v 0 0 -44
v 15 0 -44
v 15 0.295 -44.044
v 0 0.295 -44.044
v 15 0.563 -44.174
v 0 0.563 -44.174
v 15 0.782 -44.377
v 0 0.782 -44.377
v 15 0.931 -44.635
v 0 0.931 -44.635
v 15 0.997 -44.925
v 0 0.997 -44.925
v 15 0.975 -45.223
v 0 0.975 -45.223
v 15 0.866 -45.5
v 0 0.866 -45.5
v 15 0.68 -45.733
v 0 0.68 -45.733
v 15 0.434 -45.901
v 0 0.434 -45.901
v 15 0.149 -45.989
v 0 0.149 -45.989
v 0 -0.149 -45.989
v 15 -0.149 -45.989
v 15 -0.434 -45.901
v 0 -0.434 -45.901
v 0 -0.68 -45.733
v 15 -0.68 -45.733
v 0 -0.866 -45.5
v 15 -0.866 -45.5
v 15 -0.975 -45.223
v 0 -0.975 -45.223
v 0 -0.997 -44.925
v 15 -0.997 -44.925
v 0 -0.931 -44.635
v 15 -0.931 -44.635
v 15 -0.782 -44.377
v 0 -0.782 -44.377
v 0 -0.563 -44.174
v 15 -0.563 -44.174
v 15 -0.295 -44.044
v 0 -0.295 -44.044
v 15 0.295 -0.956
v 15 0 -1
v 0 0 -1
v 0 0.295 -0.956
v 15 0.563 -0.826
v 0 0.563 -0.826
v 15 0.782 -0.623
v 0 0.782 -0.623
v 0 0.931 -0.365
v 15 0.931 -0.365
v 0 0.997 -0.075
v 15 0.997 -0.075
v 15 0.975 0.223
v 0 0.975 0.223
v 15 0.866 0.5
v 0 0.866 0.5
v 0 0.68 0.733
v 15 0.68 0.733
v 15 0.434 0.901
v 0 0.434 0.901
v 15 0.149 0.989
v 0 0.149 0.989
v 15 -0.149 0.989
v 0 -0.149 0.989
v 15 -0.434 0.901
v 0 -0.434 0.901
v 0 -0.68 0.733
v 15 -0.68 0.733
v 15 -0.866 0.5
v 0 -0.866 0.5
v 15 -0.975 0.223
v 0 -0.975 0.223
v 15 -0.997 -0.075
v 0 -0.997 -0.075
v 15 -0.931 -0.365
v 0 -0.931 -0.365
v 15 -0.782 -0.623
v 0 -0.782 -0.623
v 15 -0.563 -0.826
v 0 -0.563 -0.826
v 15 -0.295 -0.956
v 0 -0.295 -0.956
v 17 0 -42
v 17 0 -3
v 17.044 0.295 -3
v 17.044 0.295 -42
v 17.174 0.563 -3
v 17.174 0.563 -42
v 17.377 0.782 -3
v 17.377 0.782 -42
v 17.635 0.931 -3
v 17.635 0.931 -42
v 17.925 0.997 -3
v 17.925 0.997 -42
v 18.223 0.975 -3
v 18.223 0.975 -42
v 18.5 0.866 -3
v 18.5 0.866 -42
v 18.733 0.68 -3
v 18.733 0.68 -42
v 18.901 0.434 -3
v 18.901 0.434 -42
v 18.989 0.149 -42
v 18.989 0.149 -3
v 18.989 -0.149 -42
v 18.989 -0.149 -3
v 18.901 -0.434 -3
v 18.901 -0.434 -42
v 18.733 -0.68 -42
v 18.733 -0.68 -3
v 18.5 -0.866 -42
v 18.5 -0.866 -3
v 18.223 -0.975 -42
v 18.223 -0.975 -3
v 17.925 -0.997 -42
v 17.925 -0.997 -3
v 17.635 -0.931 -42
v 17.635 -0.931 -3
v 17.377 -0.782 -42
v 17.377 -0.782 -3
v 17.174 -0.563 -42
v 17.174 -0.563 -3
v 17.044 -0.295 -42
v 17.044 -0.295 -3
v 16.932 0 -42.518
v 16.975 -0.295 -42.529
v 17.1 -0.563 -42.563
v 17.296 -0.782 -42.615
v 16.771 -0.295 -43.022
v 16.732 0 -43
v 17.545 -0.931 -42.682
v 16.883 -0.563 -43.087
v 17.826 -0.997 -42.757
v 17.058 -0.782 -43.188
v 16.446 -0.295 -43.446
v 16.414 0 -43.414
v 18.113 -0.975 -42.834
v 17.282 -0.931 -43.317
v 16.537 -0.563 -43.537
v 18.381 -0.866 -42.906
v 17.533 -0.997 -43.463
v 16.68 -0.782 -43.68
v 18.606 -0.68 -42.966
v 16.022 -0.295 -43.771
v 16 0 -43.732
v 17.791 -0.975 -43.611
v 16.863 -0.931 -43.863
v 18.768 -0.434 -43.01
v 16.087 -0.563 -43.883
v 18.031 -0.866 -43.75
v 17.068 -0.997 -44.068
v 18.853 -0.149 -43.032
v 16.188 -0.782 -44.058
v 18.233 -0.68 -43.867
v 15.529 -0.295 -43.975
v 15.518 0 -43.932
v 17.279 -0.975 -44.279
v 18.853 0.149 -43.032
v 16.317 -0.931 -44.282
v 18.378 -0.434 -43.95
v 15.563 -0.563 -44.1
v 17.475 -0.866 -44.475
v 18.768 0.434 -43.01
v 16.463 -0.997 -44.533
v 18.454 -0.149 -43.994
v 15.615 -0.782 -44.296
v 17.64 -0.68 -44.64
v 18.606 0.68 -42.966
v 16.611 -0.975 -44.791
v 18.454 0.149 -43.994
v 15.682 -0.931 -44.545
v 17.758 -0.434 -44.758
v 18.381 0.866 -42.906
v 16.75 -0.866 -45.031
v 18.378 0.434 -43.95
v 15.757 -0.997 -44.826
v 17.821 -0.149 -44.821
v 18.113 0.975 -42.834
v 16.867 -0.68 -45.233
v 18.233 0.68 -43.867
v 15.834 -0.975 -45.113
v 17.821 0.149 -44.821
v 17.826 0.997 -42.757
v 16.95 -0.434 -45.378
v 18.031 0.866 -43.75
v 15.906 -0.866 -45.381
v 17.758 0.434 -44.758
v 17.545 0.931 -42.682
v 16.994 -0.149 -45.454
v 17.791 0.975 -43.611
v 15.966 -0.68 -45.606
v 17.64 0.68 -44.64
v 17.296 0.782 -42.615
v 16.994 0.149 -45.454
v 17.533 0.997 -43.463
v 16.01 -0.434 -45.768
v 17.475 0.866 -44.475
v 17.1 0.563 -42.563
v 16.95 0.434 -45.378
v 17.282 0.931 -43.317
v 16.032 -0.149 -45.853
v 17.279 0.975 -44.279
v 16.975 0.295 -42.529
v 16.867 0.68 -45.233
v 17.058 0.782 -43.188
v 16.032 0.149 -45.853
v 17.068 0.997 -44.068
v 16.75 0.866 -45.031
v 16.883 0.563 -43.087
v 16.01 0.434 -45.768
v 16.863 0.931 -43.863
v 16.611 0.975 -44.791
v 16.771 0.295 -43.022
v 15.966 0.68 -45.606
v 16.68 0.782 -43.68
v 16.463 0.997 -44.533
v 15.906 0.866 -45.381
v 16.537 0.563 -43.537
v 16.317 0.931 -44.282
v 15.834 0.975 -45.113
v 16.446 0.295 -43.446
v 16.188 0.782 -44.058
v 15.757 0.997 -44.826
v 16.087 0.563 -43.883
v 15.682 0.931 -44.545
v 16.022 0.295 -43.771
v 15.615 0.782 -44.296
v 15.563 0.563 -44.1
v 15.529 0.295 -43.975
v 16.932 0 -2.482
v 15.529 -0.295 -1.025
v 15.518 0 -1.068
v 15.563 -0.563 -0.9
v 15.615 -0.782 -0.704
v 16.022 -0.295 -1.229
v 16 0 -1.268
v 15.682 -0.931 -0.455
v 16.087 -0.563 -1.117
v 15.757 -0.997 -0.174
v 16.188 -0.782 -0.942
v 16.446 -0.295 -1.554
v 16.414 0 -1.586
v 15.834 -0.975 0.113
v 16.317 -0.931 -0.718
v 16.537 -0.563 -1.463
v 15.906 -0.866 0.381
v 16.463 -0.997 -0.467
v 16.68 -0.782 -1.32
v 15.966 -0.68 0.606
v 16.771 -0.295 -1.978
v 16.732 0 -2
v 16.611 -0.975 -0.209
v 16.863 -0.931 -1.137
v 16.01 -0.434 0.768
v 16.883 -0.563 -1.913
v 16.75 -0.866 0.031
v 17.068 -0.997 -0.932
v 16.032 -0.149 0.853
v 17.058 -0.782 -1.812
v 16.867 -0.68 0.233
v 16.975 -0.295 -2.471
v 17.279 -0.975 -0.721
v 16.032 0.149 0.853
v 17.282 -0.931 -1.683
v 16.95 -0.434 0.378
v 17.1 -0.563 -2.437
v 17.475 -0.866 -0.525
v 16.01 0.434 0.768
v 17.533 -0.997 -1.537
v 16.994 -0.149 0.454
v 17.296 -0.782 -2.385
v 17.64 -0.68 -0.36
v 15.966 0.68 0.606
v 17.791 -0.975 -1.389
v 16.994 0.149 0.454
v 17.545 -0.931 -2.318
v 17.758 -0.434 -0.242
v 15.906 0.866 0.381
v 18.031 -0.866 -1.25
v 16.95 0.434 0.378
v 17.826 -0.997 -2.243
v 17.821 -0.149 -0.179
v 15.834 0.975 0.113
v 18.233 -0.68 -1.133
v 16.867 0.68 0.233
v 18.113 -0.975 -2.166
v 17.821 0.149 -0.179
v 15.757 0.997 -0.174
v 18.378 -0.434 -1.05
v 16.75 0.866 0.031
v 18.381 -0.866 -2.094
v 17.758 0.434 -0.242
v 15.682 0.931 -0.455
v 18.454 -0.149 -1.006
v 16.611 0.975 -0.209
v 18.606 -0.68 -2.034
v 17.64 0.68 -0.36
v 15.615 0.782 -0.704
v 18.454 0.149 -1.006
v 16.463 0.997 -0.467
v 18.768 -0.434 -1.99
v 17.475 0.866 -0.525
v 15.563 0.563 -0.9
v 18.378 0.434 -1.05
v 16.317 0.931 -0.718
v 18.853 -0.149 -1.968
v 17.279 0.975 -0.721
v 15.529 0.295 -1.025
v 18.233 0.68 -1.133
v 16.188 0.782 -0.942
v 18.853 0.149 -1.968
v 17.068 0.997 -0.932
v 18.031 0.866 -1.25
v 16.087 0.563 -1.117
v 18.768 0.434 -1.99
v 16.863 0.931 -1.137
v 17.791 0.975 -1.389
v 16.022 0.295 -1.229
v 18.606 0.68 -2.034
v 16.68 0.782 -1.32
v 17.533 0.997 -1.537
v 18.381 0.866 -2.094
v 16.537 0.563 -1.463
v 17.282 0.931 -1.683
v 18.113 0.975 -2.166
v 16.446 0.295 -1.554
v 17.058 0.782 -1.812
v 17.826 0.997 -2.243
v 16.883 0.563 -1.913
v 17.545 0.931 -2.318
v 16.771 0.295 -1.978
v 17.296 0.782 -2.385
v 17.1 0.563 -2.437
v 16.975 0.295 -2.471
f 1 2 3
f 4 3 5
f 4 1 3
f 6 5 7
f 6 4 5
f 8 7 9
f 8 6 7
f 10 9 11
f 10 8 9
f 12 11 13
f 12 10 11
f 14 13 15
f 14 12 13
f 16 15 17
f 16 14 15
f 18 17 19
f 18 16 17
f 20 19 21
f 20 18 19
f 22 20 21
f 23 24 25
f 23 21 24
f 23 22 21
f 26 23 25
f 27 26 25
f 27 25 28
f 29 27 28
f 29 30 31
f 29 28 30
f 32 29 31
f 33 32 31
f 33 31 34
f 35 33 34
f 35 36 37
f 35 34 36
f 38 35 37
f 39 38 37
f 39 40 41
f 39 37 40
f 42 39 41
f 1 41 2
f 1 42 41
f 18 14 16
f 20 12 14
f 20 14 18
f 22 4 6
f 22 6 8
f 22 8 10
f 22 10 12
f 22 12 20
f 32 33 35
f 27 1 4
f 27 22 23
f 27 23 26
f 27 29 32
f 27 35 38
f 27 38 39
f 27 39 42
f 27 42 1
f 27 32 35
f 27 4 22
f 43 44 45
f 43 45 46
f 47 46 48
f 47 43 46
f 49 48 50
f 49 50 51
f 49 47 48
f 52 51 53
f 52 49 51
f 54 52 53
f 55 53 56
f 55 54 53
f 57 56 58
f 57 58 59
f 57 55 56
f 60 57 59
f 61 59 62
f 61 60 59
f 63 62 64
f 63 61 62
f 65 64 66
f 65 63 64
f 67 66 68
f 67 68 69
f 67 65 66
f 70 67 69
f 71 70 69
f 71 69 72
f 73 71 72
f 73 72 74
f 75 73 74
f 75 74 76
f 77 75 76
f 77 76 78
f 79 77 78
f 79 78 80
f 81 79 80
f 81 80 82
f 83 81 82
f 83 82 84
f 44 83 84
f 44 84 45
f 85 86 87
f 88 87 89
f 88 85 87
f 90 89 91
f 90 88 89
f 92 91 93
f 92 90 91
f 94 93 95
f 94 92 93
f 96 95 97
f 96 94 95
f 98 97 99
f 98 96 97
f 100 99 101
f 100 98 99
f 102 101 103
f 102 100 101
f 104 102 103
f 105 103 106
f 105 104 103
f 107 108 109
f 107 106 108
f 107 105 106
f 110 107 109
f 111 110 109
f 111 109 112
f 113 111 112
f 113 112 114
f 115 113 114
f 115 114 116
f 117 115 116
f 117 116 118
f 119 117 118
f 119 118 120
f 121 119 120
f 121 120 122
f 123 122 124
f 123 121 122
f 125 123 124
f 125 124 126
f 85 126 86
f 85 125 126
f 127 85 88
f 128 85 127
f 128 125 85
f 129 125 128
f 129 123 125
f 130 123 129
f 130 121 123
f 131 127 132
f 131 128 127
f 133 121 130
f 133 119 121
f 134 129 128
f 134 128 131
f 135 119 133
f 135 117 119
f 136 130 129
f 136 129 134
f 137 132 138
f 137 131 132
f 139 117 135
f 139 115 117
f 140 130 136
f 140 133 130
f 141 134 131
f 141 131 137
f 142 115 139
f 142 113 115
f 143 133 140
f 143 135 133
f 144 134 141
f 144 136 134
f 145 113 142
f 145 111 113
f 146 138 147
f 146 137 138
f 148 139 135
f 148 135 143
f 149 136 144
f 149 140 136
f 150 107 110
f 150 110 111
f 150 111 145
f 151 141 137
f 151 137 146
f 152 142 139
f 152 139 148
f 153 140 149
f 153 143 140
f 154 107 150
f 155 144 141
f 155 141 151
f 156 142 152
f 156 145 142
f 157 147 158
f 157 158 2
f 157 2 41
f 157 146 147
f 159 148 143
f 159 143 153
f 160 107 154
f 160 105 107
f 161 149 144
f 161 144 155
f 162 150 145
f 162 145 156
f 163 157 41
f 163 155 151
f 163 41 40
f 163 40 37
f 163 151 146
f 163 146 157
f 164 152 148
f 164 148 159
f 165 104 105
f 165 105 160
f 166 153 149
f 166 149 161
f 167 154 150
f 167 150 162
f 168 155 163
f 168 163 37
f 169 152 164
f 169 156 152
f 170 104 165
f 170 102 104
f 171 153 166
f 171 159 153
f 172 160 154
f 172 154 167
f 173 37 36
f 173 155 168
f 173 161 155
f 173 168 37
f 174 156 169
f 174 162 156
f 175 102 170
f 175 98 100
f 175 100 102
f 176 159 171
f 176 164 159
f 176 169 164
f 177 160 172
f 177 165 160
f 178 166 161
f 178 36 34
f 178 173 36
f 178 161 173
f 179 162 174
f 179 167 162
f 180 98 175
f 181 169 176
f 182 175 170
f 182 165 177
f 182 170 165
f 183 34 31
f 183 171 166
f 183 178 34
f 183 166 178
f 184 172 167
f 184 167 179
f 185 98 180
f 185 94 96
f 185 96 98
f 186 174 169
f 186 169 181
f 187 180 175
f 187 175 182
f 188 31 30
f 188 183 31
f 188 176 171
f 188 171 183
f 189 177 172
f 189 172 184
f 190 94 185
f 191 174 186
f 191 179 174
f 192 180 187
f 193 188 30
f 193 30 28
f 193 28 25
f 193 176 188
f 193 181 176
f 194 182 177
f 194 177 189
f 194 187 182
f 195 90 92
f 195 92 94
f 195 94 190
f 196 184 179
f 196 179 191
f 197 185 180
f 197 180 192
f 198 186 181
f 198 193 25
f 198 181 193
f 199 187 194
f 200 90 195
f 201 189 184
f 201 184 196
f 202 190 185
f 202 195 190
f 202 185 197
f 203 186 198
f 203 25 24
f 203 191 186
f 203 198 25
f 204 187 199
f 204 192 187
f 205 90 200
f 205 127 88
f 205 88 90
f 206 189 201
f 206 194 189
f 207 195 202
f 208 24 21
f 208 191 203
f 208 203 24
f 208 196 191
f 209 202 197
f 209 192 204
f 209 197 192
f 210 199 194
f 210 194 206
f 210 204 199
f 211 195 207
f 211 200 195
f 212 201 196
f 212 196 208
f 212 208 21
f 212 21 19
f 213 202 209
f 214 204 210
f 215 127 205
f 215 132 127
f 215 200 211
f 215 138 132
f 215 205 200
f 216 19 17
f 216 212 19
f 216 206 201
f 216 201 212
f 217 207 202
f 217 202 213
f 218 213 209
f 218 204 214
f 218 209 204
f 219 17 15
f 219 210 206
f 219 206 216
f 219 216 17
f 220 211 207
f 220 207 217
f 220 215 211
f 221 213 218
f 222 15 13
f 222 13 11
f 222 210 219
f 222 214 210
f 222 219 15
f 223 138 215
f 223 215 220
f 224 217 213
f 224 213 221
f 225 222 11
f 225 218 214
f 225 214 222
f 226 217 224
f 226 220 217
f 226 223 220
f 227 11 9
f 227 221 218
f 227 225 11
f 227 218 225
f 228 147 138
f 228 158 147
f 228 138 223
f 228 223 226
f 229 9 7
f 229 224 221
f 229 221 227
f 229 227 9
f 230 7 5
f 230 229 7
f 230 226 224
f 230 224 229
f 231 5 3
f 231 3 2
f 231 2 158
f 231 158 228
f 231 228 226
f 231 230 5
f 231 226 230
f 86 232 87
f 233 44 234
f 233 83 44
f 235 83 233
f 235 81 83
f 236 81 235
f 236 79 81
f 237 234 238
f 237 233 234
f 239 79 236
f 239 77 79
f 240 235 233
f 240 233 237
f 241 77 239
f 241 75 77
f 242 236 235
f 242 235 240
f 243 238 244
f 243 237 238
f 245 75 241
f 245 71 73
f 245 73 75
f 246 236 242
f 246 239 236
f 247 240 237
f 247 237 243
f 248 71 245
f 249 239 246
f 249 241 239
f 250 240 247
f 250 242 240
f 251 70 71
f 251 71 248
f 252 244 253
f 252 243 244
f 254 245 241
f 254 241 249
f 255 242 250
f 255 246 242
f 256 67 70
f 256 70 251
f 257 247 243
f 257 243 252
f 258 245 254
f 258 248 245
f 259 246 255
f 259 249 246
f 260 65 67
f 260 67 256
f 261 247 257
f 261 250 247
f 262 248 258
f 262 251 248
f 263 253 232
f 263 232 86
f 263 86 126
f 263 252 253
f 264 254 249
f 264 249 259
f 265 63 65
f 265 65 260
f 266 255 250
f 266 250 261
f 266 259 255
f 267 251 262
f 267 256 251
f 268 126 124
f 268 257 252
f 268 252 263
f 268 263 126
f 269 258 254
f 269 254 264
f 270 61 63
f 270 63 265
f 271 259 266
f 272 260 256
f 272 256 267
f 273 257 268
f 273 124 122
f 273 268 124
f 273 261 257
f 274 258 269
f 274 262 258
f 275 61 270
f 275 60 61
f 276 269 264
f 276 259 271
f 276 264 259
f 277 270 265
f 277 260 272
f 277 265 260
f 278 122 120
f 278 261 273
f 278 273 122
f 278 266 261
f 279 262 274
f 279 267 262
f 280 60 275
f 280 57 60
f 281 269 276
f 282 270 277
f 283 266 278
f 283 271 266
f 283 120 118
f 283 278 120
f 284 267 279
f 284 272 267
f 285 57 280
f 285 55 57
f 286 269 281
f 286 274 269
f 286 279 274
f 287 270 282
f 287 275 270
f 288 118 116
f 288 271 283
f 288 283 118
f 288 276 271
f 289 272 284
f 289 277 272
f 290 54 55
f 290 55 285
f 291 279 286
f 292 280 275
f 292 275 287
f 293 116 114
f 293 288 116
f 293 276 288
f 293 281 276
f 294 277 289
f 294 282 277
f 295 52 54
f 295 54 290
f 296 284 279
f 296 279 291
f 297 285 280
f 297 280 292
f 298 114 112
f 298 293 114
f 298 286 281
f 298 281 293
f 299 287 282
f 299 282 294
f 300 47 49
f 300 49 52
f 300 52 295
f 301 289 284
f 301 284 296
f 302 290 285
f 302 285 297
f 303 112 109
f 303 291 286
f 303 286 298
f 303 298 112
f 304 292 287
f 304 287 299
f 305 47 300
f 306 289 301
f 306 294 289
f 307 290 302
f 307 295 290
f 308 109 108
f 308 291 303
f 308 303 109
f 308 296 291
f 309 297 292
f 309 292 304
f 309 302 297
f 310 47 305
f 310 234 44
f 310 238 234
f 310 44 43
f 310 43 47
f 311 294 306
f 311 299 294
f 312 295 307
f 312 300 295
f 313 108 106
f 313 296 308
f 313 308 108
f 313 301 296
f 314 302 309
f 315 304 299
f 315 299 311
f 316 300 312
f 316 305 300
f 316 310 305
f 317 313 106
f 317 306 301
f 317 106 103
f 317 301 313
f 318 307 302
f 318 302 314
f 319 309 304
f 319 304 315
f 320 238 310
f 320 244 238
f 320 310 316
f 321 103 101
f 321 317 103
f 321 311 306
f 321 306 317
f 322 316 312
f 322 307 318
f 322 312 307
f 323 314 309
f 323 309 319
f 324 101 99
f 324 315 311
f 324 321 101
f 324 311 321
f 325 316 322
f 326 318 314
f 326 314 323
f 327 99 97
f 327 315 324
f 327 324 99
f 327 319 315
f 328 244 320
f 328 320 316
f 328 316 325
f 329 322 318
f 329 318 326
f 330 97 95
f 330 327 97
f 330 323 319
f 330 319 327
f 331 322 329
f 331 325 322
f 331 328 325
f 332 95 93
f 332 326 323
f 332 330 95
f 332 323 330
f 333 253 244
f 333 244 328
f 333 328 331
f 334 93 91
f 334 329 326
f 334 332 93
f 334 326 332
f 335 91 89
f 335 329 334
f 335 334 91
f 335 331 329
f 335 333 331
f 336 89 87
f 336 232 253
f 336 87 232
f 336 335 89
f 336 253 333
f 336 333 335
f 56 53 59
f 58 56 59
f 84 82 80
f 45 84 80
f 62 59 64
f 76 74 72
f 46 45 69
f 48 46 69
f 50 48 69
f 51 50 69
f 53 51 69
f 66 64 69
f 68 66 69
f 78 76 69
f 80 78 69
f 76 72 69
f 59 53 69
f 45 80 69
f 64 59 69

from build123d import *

# Parameters (mm, degrees)
SKETCH_1_R = 1


with BuildPart() as part:
    # По траектории1: sweep along a curve in space
    with BuildLine() as sweep_1_path:
        Line((0, 0, 0), (15, 0, 0))
        ThreePointArc((15, 0, 0), (17.121320344, 0, -0.878679656), (18, 0, -3))
        Line((18, 0, -3), (18, 0, -42))
        ThreePointArc((18, 0, -42), (17.121320344, 0, -44.121320344), (15, 0, -45))
        Line((15, 0, -45), (0, 0, -45))
    # Эскиз1 → По траектории1 (sweep)
    with BuildSketch(Plane(origin=(0, 0, 0), x_dir=(0, 0, -1), z_dir=(1, 0, 0))):
        Circle(SKETCH_1_R)
    sweep(path=sweep_1_path.line)


solid = part.part
